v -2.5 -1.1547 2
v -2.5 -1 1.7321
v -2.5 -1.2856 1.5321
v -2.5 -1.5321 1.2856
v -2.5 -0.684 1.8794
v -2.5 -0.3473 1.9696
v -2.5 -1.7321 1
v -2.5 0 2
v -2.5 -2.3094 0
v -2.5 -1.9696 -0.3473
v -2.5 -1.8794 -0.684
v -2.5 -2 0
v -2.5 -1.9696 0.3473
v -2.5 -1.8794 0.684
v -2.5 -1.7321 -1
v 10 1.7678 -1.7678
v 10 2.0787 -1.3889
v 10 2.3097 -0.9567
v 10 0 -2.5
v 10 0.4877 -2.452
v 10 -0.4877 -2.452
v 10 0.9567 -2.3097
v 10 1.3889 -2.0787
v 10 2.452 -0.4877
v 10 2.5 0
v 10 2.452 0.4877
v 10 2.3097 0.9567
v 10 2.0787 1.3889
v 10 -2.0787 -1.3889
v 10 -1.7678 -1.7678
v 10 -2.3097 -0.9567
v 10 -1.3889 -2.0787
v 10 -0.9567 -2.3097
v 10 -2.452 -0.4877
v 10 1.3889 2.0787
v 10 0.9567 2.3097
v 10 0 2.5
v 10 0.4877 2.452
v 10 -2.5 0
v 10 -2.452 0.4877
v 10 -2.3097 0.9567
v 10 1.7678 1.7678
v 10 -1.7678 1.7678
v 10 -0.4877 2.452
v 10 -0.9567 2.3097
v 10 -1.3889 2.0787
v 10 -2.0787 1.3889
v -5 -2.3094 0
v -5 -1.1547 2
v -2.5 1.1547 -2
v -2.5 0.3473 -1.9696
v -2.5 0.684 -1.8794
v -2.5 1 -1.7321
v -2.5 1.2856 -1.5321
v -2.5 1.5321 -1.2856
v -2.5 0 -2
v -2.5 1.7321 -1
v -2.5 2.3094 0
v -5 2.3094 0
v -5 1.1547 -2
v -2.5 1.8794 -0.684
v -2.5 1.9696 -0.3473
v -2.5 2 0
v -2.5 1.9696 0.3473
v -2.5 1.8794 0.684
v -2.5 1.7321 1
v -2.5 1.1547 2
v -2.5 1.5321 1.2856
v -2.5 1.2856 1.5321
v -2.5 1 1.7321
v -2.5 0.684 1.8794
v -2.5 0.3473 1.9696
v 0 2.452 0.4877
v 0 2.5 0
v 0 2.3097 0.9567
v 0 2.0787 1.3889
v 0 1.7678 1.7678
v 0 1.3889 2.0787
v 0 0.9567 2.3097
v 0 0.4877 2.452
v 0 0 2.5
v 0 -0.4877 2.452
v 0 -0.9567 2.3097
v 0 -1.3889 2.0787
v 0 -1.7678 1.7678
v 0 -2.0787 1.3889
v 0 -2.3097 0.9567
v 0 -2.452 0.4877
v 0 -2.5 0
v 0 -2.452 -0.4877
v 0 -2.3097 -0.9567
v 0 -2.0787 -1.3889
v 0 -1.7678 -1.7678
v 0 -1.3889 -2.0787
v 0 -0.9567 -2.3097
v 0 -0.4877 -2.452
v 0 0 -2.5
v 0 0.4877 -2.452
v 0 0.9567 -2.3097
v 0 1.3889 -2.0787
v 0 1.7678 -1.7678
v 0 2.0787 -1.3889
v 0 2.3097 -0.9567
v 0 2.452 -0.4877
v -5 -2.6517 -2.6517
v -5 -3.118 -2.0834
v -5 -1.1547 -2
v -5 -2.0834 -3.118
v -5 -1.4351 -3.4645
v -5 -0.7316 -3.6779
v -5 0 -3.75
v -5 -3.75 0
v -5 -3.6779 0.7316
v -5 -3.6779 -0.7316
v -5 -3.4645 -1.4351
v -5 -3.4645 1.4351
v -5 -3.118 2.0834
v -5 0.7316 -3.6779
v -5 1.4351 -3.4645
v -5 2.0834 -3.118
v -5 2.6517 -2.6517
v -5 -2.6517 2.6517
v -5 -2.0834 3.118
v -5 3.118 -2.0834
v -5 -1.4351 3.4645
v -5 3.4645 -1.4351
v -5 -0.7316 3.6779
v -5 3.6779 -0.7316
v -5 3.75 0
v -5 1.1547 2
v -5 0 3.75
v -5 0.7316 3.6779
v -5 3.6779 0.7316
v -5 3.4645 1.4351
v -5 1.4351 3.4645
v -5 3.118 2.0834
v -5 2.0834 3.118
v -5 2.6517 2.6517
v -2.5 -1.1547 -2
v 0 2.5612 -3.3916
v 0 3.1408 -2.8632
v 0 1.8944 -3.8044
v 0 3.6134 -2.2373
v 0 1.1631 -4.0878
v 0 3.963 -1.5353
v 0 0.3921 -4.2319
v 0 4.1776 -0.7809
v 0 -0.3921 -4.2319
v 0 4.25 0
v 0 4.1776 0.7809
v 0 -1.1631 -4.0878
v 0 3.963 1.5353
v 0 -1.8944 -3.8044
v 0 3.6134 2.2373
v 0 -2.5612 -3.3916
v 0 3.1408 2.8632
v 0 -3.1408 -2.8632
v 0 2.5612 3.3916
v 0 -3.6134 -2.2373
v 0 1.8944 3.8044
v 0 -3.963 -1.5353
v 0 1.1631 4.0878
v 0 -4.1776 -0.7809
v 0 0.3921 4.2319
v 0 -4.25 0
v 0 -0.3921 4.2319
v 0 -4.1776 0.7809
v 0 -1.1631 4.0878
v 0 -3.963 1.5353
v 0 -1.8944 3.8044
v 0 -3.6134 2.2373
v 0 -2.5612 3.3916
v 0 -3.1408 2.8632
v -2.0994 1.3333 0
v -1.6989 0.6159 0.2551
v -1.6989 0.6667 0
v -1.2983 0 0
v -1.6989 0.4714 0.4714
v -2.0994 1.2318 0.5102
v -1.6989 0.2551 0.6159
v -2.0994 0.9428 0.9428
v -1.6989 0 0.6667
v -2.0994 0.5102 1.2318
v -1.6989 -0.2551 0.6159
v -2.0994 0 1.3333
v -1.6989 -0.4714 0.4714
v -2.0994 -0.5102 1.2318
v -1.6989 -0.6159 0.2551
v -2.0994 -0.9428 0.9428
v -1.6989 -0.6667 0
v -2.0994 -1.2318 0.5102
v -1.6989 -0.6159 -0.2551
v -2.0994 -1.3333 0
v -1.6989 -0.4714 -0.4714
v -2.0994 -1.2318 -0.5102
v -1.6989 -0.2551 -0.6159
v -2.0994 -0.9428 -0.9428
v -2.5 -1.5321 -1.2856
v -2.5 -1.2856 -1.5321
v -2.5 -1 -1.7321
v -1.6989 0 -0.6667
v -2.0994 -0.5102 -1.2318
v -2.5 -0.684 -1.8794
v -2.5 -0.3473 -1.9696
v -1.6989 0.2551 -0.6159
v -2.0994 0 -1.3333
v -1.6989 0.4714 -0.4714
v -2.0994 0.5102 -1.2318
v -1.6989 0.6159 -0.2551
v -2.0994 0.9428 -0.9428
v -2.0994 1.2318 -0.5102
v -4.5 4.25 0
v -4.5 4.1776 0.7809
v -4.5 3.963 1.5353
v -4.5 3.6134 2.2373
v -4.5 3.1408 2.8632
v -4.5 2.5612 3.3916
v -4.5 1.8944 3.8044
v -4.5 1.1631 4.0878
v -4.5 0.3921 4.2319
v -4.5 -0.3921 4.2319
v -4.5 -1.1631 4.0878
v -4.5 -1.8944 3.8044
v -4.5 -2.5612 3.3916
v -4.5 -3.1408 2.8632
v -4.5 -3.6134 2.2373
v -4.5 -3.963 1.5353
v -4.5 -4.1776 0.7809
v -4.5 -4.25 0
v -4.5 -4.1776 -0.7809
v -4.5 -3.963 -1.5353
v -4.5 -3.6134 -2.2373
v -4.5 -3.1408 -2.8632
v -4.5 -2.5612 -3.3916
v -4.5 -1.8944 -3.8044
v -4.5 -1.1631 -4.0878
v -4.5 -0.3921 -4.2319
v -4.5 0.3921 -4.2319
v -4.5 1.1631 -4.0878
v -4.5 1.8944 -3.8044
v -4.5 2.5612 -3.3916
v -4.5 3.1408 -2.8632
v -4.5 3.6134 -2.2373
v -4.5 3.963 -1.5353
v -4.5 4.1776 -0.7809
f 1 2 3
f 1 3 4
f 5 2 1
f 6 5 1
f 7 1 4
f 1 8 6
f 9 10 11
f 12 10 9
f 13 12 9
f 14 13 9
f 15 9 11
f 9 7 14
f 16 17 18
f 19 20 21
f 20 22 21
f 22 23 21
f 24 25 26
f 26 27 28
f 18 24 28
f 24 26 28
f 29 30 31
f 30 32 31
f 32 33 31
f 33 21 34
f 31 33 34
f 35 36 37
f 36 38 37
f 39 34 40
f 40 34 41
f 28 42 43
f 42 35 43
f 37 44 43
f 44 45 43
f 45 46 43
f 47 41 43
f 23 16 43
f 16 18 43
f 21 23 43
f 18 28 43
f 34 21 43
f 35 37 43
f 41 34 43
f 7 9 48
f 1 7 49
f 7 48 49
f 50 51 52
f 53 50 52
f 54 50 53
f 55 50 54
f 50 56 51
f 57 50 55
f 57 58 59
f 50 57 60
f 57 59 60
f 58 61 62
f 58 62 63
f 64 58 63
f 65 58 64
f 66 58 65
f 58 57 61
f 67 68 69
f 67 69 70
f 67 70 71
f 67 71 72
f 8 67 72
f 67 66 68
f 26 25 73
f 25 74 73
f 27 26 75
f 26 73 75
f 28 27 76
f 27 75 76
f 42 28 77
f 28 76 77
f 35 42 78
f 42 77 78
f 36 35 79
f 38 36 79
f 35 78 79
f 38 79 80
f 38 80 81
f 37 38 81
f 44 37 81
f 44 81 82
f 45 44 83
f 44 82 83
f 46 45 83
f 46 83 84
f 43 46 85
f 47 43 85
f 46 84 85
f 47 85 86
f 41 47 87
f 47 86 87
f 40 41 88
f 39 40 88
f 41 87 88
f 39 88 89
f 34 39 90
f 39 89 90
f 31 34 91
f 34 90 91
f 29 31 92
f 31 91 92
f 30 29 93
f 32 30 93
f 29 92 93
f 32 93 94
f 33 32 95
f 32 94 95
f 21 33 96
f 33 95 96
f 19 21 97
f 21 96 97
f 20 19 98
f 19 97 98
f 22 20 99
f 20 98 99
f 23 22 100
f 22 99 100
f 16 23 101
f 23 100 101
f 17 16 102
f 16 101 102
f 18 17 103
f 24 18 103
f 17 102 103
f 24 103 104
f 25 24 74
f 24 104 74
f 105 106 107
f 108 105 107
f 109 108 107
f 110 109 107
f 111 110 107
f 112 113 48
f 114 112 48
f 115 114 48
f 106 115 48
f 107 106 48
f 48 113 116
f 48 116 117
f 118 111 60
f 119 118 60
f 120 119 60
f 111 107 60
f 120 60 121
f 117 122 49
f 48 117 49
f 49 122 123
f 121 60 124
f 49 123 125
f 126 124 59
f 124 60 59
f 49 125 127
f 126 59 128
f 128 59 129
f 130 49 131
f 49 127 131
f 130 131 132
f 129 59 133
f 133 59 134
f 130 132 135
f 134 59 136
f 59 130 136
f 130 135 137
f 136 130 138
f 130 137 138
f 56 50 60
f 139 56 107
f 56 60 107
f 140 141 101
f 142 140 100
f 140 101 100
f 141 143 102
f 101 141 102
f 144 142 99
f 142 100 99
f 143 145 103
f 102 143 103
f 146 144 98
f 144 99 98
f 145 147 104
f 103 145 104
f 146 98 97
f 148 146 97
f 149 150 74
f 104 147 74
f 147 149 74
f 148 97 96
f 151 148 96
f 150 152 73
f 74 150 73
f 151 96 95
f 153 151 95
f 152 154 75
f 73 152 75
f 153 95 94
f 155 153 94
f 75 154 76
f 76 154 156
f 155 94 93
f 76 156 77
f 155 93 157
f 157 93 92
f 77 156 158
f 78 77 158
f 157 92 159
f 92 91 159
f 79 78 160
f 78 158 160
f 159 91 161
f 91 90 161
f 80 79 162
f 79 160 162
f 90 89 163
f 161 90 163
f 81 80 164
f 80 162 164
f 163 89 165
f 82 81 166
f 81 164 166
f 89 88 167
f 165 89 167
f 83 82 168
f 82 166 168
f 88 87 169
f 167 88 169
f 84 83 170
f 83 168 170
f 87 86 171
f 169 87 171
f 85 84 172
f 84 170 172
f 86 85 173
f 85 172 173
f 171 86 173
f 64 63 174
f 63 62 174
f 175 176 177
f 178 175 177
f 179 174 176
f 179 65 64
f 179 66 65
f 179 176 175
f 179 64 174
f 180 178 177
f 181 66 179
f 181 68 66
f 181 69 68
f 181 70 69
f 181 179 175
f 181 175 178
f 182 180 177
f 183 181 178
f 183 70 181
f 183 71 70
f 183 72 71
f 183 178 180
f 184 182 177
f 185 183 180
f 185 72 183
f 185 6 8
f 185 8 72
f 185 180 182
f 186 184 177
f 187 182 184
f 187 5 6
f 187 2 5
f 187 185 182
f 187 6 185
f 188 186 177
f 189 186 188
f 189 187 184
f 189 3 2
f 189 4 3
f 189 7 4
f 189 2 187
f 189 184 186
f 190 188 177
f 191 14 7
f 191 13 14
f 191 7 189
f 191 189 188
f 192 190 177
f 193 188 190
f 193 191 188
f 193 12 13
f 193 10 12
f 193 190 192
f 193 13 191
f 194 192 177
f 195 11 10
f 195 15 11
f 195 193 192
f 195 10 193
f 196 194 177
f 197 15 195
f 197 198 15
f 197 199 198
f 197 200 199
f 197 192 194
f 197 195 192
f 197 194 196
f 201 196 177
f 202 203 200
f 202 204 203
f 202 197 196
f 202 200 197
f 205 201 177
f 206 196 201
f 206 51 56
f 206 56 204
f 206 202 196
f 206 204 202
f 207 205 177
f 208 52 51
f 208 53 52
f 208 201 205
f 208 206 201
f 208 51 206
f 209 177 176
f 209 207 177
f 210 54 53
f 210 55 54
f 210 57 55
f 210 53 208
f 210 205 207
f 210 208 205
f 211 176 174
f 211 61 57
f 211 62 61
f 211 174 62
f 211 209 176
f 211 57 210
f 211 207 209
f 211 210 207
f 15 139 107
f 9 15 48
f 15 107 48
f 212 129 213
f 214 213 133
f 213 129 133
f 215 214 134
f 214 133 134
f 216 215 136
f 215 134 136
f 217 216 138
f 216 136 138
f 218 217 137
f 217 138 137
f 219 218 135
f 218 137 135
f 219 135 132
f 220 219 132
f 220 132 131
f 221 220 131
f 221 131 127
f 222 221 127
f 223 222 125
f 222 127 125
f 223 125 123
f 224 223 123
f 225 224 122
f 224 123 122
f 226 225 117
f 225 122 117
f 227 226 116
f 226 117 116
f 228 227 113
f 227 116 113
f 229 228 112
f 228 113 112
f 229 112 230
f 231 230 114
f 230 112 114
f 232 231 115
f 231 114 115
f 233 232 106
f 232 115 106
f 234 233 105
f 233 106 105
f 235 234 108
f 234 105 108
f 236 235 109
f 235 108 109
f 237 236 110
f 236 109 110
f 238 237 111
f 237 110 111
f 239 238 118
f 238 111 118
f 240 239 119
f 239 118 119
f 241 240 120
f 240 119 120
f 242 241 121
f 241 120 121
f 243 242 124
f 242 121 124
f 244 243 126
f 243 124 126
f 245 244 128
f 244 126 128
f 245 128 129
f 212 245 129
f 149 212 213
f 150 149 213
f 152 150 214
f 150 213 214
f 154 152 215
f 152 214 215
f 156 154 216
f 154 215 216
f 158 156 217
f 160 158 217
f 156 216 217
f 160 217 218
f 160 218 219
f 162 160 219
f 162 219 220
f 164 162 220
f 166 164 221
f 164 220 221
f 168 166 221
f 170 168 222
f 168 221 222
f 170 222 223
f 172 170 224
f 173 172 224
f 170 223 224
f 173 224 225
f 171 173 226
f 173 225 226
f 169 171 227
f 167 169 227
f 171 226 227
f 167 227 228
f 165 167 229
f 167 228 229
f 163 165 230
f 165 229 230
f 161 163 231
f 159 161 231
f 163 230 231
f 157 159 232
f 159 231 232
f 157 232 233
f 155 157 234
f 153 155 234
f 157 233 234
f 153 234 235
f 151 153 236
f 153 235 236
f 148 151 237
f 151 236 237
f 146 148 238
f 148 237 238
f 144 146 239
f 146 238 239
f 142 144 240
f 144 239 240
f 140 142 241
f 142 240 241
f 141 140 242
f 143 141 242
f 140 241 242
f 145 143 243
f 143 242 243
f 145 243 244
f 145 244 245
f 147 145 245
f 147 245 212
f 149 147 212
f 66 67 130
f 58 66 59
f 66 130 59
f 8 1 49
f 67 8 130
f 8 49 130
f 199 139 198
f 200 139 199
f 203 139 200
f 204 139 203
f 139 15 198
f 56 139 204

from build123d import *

# Parameters (mm, degrees)
CHAMFER1_SIZE      = 0.5
CUT_EXTRUDE1_DEPTH = 2.5


with BuildPart() as part:
    # Sketch1 → Revolve1 (revolve)
    with BuildSketch(Plane.XY):
        Polygon((-5, 0), (10, 0), (10, 2.5), (0, 2.5), (0, 4.25), (-5, 4.25), align=None)
    revolve(axis=Axis((-5, 0, 0), (1, 0, 0)))

    # Chamfer1
    chamfer1_edges = [part.edges().sort_by_distance(p)[0] for p in [
        (-5, -4.25, 0),
    ]]
    chamfer(chamfer1_edges, length=CHAMFER1_SIZE)

    # Sketch2 → Cut-Revolve1 (revolve, cut)
    with BuildSketch(Plane.XY):
        Polygon((-1.298278762, 0), (-2.5, 2), (-5, 2), (-5, 0), align=None)
    revolve(axis=Axis((-5, 0, 0), (1, 0, 0)), mode=Mode.SUBTRACT)

    # Sketch3 → Cut-Extrude1 (cut)
    with BuildSketch(Plane.ZY.offset(5)):
        Polygon((0, -2.309401077), (2, -1.154700538), (2, 1.154700538), (0, 2.309401077), (-2, 1.154700538), (-2, -1.154700538), align=None)
    extrude(amount=-CUT_EXTRUDE1_DEPTH, mode=Mode.SUBTRACT)


solid = part.part
